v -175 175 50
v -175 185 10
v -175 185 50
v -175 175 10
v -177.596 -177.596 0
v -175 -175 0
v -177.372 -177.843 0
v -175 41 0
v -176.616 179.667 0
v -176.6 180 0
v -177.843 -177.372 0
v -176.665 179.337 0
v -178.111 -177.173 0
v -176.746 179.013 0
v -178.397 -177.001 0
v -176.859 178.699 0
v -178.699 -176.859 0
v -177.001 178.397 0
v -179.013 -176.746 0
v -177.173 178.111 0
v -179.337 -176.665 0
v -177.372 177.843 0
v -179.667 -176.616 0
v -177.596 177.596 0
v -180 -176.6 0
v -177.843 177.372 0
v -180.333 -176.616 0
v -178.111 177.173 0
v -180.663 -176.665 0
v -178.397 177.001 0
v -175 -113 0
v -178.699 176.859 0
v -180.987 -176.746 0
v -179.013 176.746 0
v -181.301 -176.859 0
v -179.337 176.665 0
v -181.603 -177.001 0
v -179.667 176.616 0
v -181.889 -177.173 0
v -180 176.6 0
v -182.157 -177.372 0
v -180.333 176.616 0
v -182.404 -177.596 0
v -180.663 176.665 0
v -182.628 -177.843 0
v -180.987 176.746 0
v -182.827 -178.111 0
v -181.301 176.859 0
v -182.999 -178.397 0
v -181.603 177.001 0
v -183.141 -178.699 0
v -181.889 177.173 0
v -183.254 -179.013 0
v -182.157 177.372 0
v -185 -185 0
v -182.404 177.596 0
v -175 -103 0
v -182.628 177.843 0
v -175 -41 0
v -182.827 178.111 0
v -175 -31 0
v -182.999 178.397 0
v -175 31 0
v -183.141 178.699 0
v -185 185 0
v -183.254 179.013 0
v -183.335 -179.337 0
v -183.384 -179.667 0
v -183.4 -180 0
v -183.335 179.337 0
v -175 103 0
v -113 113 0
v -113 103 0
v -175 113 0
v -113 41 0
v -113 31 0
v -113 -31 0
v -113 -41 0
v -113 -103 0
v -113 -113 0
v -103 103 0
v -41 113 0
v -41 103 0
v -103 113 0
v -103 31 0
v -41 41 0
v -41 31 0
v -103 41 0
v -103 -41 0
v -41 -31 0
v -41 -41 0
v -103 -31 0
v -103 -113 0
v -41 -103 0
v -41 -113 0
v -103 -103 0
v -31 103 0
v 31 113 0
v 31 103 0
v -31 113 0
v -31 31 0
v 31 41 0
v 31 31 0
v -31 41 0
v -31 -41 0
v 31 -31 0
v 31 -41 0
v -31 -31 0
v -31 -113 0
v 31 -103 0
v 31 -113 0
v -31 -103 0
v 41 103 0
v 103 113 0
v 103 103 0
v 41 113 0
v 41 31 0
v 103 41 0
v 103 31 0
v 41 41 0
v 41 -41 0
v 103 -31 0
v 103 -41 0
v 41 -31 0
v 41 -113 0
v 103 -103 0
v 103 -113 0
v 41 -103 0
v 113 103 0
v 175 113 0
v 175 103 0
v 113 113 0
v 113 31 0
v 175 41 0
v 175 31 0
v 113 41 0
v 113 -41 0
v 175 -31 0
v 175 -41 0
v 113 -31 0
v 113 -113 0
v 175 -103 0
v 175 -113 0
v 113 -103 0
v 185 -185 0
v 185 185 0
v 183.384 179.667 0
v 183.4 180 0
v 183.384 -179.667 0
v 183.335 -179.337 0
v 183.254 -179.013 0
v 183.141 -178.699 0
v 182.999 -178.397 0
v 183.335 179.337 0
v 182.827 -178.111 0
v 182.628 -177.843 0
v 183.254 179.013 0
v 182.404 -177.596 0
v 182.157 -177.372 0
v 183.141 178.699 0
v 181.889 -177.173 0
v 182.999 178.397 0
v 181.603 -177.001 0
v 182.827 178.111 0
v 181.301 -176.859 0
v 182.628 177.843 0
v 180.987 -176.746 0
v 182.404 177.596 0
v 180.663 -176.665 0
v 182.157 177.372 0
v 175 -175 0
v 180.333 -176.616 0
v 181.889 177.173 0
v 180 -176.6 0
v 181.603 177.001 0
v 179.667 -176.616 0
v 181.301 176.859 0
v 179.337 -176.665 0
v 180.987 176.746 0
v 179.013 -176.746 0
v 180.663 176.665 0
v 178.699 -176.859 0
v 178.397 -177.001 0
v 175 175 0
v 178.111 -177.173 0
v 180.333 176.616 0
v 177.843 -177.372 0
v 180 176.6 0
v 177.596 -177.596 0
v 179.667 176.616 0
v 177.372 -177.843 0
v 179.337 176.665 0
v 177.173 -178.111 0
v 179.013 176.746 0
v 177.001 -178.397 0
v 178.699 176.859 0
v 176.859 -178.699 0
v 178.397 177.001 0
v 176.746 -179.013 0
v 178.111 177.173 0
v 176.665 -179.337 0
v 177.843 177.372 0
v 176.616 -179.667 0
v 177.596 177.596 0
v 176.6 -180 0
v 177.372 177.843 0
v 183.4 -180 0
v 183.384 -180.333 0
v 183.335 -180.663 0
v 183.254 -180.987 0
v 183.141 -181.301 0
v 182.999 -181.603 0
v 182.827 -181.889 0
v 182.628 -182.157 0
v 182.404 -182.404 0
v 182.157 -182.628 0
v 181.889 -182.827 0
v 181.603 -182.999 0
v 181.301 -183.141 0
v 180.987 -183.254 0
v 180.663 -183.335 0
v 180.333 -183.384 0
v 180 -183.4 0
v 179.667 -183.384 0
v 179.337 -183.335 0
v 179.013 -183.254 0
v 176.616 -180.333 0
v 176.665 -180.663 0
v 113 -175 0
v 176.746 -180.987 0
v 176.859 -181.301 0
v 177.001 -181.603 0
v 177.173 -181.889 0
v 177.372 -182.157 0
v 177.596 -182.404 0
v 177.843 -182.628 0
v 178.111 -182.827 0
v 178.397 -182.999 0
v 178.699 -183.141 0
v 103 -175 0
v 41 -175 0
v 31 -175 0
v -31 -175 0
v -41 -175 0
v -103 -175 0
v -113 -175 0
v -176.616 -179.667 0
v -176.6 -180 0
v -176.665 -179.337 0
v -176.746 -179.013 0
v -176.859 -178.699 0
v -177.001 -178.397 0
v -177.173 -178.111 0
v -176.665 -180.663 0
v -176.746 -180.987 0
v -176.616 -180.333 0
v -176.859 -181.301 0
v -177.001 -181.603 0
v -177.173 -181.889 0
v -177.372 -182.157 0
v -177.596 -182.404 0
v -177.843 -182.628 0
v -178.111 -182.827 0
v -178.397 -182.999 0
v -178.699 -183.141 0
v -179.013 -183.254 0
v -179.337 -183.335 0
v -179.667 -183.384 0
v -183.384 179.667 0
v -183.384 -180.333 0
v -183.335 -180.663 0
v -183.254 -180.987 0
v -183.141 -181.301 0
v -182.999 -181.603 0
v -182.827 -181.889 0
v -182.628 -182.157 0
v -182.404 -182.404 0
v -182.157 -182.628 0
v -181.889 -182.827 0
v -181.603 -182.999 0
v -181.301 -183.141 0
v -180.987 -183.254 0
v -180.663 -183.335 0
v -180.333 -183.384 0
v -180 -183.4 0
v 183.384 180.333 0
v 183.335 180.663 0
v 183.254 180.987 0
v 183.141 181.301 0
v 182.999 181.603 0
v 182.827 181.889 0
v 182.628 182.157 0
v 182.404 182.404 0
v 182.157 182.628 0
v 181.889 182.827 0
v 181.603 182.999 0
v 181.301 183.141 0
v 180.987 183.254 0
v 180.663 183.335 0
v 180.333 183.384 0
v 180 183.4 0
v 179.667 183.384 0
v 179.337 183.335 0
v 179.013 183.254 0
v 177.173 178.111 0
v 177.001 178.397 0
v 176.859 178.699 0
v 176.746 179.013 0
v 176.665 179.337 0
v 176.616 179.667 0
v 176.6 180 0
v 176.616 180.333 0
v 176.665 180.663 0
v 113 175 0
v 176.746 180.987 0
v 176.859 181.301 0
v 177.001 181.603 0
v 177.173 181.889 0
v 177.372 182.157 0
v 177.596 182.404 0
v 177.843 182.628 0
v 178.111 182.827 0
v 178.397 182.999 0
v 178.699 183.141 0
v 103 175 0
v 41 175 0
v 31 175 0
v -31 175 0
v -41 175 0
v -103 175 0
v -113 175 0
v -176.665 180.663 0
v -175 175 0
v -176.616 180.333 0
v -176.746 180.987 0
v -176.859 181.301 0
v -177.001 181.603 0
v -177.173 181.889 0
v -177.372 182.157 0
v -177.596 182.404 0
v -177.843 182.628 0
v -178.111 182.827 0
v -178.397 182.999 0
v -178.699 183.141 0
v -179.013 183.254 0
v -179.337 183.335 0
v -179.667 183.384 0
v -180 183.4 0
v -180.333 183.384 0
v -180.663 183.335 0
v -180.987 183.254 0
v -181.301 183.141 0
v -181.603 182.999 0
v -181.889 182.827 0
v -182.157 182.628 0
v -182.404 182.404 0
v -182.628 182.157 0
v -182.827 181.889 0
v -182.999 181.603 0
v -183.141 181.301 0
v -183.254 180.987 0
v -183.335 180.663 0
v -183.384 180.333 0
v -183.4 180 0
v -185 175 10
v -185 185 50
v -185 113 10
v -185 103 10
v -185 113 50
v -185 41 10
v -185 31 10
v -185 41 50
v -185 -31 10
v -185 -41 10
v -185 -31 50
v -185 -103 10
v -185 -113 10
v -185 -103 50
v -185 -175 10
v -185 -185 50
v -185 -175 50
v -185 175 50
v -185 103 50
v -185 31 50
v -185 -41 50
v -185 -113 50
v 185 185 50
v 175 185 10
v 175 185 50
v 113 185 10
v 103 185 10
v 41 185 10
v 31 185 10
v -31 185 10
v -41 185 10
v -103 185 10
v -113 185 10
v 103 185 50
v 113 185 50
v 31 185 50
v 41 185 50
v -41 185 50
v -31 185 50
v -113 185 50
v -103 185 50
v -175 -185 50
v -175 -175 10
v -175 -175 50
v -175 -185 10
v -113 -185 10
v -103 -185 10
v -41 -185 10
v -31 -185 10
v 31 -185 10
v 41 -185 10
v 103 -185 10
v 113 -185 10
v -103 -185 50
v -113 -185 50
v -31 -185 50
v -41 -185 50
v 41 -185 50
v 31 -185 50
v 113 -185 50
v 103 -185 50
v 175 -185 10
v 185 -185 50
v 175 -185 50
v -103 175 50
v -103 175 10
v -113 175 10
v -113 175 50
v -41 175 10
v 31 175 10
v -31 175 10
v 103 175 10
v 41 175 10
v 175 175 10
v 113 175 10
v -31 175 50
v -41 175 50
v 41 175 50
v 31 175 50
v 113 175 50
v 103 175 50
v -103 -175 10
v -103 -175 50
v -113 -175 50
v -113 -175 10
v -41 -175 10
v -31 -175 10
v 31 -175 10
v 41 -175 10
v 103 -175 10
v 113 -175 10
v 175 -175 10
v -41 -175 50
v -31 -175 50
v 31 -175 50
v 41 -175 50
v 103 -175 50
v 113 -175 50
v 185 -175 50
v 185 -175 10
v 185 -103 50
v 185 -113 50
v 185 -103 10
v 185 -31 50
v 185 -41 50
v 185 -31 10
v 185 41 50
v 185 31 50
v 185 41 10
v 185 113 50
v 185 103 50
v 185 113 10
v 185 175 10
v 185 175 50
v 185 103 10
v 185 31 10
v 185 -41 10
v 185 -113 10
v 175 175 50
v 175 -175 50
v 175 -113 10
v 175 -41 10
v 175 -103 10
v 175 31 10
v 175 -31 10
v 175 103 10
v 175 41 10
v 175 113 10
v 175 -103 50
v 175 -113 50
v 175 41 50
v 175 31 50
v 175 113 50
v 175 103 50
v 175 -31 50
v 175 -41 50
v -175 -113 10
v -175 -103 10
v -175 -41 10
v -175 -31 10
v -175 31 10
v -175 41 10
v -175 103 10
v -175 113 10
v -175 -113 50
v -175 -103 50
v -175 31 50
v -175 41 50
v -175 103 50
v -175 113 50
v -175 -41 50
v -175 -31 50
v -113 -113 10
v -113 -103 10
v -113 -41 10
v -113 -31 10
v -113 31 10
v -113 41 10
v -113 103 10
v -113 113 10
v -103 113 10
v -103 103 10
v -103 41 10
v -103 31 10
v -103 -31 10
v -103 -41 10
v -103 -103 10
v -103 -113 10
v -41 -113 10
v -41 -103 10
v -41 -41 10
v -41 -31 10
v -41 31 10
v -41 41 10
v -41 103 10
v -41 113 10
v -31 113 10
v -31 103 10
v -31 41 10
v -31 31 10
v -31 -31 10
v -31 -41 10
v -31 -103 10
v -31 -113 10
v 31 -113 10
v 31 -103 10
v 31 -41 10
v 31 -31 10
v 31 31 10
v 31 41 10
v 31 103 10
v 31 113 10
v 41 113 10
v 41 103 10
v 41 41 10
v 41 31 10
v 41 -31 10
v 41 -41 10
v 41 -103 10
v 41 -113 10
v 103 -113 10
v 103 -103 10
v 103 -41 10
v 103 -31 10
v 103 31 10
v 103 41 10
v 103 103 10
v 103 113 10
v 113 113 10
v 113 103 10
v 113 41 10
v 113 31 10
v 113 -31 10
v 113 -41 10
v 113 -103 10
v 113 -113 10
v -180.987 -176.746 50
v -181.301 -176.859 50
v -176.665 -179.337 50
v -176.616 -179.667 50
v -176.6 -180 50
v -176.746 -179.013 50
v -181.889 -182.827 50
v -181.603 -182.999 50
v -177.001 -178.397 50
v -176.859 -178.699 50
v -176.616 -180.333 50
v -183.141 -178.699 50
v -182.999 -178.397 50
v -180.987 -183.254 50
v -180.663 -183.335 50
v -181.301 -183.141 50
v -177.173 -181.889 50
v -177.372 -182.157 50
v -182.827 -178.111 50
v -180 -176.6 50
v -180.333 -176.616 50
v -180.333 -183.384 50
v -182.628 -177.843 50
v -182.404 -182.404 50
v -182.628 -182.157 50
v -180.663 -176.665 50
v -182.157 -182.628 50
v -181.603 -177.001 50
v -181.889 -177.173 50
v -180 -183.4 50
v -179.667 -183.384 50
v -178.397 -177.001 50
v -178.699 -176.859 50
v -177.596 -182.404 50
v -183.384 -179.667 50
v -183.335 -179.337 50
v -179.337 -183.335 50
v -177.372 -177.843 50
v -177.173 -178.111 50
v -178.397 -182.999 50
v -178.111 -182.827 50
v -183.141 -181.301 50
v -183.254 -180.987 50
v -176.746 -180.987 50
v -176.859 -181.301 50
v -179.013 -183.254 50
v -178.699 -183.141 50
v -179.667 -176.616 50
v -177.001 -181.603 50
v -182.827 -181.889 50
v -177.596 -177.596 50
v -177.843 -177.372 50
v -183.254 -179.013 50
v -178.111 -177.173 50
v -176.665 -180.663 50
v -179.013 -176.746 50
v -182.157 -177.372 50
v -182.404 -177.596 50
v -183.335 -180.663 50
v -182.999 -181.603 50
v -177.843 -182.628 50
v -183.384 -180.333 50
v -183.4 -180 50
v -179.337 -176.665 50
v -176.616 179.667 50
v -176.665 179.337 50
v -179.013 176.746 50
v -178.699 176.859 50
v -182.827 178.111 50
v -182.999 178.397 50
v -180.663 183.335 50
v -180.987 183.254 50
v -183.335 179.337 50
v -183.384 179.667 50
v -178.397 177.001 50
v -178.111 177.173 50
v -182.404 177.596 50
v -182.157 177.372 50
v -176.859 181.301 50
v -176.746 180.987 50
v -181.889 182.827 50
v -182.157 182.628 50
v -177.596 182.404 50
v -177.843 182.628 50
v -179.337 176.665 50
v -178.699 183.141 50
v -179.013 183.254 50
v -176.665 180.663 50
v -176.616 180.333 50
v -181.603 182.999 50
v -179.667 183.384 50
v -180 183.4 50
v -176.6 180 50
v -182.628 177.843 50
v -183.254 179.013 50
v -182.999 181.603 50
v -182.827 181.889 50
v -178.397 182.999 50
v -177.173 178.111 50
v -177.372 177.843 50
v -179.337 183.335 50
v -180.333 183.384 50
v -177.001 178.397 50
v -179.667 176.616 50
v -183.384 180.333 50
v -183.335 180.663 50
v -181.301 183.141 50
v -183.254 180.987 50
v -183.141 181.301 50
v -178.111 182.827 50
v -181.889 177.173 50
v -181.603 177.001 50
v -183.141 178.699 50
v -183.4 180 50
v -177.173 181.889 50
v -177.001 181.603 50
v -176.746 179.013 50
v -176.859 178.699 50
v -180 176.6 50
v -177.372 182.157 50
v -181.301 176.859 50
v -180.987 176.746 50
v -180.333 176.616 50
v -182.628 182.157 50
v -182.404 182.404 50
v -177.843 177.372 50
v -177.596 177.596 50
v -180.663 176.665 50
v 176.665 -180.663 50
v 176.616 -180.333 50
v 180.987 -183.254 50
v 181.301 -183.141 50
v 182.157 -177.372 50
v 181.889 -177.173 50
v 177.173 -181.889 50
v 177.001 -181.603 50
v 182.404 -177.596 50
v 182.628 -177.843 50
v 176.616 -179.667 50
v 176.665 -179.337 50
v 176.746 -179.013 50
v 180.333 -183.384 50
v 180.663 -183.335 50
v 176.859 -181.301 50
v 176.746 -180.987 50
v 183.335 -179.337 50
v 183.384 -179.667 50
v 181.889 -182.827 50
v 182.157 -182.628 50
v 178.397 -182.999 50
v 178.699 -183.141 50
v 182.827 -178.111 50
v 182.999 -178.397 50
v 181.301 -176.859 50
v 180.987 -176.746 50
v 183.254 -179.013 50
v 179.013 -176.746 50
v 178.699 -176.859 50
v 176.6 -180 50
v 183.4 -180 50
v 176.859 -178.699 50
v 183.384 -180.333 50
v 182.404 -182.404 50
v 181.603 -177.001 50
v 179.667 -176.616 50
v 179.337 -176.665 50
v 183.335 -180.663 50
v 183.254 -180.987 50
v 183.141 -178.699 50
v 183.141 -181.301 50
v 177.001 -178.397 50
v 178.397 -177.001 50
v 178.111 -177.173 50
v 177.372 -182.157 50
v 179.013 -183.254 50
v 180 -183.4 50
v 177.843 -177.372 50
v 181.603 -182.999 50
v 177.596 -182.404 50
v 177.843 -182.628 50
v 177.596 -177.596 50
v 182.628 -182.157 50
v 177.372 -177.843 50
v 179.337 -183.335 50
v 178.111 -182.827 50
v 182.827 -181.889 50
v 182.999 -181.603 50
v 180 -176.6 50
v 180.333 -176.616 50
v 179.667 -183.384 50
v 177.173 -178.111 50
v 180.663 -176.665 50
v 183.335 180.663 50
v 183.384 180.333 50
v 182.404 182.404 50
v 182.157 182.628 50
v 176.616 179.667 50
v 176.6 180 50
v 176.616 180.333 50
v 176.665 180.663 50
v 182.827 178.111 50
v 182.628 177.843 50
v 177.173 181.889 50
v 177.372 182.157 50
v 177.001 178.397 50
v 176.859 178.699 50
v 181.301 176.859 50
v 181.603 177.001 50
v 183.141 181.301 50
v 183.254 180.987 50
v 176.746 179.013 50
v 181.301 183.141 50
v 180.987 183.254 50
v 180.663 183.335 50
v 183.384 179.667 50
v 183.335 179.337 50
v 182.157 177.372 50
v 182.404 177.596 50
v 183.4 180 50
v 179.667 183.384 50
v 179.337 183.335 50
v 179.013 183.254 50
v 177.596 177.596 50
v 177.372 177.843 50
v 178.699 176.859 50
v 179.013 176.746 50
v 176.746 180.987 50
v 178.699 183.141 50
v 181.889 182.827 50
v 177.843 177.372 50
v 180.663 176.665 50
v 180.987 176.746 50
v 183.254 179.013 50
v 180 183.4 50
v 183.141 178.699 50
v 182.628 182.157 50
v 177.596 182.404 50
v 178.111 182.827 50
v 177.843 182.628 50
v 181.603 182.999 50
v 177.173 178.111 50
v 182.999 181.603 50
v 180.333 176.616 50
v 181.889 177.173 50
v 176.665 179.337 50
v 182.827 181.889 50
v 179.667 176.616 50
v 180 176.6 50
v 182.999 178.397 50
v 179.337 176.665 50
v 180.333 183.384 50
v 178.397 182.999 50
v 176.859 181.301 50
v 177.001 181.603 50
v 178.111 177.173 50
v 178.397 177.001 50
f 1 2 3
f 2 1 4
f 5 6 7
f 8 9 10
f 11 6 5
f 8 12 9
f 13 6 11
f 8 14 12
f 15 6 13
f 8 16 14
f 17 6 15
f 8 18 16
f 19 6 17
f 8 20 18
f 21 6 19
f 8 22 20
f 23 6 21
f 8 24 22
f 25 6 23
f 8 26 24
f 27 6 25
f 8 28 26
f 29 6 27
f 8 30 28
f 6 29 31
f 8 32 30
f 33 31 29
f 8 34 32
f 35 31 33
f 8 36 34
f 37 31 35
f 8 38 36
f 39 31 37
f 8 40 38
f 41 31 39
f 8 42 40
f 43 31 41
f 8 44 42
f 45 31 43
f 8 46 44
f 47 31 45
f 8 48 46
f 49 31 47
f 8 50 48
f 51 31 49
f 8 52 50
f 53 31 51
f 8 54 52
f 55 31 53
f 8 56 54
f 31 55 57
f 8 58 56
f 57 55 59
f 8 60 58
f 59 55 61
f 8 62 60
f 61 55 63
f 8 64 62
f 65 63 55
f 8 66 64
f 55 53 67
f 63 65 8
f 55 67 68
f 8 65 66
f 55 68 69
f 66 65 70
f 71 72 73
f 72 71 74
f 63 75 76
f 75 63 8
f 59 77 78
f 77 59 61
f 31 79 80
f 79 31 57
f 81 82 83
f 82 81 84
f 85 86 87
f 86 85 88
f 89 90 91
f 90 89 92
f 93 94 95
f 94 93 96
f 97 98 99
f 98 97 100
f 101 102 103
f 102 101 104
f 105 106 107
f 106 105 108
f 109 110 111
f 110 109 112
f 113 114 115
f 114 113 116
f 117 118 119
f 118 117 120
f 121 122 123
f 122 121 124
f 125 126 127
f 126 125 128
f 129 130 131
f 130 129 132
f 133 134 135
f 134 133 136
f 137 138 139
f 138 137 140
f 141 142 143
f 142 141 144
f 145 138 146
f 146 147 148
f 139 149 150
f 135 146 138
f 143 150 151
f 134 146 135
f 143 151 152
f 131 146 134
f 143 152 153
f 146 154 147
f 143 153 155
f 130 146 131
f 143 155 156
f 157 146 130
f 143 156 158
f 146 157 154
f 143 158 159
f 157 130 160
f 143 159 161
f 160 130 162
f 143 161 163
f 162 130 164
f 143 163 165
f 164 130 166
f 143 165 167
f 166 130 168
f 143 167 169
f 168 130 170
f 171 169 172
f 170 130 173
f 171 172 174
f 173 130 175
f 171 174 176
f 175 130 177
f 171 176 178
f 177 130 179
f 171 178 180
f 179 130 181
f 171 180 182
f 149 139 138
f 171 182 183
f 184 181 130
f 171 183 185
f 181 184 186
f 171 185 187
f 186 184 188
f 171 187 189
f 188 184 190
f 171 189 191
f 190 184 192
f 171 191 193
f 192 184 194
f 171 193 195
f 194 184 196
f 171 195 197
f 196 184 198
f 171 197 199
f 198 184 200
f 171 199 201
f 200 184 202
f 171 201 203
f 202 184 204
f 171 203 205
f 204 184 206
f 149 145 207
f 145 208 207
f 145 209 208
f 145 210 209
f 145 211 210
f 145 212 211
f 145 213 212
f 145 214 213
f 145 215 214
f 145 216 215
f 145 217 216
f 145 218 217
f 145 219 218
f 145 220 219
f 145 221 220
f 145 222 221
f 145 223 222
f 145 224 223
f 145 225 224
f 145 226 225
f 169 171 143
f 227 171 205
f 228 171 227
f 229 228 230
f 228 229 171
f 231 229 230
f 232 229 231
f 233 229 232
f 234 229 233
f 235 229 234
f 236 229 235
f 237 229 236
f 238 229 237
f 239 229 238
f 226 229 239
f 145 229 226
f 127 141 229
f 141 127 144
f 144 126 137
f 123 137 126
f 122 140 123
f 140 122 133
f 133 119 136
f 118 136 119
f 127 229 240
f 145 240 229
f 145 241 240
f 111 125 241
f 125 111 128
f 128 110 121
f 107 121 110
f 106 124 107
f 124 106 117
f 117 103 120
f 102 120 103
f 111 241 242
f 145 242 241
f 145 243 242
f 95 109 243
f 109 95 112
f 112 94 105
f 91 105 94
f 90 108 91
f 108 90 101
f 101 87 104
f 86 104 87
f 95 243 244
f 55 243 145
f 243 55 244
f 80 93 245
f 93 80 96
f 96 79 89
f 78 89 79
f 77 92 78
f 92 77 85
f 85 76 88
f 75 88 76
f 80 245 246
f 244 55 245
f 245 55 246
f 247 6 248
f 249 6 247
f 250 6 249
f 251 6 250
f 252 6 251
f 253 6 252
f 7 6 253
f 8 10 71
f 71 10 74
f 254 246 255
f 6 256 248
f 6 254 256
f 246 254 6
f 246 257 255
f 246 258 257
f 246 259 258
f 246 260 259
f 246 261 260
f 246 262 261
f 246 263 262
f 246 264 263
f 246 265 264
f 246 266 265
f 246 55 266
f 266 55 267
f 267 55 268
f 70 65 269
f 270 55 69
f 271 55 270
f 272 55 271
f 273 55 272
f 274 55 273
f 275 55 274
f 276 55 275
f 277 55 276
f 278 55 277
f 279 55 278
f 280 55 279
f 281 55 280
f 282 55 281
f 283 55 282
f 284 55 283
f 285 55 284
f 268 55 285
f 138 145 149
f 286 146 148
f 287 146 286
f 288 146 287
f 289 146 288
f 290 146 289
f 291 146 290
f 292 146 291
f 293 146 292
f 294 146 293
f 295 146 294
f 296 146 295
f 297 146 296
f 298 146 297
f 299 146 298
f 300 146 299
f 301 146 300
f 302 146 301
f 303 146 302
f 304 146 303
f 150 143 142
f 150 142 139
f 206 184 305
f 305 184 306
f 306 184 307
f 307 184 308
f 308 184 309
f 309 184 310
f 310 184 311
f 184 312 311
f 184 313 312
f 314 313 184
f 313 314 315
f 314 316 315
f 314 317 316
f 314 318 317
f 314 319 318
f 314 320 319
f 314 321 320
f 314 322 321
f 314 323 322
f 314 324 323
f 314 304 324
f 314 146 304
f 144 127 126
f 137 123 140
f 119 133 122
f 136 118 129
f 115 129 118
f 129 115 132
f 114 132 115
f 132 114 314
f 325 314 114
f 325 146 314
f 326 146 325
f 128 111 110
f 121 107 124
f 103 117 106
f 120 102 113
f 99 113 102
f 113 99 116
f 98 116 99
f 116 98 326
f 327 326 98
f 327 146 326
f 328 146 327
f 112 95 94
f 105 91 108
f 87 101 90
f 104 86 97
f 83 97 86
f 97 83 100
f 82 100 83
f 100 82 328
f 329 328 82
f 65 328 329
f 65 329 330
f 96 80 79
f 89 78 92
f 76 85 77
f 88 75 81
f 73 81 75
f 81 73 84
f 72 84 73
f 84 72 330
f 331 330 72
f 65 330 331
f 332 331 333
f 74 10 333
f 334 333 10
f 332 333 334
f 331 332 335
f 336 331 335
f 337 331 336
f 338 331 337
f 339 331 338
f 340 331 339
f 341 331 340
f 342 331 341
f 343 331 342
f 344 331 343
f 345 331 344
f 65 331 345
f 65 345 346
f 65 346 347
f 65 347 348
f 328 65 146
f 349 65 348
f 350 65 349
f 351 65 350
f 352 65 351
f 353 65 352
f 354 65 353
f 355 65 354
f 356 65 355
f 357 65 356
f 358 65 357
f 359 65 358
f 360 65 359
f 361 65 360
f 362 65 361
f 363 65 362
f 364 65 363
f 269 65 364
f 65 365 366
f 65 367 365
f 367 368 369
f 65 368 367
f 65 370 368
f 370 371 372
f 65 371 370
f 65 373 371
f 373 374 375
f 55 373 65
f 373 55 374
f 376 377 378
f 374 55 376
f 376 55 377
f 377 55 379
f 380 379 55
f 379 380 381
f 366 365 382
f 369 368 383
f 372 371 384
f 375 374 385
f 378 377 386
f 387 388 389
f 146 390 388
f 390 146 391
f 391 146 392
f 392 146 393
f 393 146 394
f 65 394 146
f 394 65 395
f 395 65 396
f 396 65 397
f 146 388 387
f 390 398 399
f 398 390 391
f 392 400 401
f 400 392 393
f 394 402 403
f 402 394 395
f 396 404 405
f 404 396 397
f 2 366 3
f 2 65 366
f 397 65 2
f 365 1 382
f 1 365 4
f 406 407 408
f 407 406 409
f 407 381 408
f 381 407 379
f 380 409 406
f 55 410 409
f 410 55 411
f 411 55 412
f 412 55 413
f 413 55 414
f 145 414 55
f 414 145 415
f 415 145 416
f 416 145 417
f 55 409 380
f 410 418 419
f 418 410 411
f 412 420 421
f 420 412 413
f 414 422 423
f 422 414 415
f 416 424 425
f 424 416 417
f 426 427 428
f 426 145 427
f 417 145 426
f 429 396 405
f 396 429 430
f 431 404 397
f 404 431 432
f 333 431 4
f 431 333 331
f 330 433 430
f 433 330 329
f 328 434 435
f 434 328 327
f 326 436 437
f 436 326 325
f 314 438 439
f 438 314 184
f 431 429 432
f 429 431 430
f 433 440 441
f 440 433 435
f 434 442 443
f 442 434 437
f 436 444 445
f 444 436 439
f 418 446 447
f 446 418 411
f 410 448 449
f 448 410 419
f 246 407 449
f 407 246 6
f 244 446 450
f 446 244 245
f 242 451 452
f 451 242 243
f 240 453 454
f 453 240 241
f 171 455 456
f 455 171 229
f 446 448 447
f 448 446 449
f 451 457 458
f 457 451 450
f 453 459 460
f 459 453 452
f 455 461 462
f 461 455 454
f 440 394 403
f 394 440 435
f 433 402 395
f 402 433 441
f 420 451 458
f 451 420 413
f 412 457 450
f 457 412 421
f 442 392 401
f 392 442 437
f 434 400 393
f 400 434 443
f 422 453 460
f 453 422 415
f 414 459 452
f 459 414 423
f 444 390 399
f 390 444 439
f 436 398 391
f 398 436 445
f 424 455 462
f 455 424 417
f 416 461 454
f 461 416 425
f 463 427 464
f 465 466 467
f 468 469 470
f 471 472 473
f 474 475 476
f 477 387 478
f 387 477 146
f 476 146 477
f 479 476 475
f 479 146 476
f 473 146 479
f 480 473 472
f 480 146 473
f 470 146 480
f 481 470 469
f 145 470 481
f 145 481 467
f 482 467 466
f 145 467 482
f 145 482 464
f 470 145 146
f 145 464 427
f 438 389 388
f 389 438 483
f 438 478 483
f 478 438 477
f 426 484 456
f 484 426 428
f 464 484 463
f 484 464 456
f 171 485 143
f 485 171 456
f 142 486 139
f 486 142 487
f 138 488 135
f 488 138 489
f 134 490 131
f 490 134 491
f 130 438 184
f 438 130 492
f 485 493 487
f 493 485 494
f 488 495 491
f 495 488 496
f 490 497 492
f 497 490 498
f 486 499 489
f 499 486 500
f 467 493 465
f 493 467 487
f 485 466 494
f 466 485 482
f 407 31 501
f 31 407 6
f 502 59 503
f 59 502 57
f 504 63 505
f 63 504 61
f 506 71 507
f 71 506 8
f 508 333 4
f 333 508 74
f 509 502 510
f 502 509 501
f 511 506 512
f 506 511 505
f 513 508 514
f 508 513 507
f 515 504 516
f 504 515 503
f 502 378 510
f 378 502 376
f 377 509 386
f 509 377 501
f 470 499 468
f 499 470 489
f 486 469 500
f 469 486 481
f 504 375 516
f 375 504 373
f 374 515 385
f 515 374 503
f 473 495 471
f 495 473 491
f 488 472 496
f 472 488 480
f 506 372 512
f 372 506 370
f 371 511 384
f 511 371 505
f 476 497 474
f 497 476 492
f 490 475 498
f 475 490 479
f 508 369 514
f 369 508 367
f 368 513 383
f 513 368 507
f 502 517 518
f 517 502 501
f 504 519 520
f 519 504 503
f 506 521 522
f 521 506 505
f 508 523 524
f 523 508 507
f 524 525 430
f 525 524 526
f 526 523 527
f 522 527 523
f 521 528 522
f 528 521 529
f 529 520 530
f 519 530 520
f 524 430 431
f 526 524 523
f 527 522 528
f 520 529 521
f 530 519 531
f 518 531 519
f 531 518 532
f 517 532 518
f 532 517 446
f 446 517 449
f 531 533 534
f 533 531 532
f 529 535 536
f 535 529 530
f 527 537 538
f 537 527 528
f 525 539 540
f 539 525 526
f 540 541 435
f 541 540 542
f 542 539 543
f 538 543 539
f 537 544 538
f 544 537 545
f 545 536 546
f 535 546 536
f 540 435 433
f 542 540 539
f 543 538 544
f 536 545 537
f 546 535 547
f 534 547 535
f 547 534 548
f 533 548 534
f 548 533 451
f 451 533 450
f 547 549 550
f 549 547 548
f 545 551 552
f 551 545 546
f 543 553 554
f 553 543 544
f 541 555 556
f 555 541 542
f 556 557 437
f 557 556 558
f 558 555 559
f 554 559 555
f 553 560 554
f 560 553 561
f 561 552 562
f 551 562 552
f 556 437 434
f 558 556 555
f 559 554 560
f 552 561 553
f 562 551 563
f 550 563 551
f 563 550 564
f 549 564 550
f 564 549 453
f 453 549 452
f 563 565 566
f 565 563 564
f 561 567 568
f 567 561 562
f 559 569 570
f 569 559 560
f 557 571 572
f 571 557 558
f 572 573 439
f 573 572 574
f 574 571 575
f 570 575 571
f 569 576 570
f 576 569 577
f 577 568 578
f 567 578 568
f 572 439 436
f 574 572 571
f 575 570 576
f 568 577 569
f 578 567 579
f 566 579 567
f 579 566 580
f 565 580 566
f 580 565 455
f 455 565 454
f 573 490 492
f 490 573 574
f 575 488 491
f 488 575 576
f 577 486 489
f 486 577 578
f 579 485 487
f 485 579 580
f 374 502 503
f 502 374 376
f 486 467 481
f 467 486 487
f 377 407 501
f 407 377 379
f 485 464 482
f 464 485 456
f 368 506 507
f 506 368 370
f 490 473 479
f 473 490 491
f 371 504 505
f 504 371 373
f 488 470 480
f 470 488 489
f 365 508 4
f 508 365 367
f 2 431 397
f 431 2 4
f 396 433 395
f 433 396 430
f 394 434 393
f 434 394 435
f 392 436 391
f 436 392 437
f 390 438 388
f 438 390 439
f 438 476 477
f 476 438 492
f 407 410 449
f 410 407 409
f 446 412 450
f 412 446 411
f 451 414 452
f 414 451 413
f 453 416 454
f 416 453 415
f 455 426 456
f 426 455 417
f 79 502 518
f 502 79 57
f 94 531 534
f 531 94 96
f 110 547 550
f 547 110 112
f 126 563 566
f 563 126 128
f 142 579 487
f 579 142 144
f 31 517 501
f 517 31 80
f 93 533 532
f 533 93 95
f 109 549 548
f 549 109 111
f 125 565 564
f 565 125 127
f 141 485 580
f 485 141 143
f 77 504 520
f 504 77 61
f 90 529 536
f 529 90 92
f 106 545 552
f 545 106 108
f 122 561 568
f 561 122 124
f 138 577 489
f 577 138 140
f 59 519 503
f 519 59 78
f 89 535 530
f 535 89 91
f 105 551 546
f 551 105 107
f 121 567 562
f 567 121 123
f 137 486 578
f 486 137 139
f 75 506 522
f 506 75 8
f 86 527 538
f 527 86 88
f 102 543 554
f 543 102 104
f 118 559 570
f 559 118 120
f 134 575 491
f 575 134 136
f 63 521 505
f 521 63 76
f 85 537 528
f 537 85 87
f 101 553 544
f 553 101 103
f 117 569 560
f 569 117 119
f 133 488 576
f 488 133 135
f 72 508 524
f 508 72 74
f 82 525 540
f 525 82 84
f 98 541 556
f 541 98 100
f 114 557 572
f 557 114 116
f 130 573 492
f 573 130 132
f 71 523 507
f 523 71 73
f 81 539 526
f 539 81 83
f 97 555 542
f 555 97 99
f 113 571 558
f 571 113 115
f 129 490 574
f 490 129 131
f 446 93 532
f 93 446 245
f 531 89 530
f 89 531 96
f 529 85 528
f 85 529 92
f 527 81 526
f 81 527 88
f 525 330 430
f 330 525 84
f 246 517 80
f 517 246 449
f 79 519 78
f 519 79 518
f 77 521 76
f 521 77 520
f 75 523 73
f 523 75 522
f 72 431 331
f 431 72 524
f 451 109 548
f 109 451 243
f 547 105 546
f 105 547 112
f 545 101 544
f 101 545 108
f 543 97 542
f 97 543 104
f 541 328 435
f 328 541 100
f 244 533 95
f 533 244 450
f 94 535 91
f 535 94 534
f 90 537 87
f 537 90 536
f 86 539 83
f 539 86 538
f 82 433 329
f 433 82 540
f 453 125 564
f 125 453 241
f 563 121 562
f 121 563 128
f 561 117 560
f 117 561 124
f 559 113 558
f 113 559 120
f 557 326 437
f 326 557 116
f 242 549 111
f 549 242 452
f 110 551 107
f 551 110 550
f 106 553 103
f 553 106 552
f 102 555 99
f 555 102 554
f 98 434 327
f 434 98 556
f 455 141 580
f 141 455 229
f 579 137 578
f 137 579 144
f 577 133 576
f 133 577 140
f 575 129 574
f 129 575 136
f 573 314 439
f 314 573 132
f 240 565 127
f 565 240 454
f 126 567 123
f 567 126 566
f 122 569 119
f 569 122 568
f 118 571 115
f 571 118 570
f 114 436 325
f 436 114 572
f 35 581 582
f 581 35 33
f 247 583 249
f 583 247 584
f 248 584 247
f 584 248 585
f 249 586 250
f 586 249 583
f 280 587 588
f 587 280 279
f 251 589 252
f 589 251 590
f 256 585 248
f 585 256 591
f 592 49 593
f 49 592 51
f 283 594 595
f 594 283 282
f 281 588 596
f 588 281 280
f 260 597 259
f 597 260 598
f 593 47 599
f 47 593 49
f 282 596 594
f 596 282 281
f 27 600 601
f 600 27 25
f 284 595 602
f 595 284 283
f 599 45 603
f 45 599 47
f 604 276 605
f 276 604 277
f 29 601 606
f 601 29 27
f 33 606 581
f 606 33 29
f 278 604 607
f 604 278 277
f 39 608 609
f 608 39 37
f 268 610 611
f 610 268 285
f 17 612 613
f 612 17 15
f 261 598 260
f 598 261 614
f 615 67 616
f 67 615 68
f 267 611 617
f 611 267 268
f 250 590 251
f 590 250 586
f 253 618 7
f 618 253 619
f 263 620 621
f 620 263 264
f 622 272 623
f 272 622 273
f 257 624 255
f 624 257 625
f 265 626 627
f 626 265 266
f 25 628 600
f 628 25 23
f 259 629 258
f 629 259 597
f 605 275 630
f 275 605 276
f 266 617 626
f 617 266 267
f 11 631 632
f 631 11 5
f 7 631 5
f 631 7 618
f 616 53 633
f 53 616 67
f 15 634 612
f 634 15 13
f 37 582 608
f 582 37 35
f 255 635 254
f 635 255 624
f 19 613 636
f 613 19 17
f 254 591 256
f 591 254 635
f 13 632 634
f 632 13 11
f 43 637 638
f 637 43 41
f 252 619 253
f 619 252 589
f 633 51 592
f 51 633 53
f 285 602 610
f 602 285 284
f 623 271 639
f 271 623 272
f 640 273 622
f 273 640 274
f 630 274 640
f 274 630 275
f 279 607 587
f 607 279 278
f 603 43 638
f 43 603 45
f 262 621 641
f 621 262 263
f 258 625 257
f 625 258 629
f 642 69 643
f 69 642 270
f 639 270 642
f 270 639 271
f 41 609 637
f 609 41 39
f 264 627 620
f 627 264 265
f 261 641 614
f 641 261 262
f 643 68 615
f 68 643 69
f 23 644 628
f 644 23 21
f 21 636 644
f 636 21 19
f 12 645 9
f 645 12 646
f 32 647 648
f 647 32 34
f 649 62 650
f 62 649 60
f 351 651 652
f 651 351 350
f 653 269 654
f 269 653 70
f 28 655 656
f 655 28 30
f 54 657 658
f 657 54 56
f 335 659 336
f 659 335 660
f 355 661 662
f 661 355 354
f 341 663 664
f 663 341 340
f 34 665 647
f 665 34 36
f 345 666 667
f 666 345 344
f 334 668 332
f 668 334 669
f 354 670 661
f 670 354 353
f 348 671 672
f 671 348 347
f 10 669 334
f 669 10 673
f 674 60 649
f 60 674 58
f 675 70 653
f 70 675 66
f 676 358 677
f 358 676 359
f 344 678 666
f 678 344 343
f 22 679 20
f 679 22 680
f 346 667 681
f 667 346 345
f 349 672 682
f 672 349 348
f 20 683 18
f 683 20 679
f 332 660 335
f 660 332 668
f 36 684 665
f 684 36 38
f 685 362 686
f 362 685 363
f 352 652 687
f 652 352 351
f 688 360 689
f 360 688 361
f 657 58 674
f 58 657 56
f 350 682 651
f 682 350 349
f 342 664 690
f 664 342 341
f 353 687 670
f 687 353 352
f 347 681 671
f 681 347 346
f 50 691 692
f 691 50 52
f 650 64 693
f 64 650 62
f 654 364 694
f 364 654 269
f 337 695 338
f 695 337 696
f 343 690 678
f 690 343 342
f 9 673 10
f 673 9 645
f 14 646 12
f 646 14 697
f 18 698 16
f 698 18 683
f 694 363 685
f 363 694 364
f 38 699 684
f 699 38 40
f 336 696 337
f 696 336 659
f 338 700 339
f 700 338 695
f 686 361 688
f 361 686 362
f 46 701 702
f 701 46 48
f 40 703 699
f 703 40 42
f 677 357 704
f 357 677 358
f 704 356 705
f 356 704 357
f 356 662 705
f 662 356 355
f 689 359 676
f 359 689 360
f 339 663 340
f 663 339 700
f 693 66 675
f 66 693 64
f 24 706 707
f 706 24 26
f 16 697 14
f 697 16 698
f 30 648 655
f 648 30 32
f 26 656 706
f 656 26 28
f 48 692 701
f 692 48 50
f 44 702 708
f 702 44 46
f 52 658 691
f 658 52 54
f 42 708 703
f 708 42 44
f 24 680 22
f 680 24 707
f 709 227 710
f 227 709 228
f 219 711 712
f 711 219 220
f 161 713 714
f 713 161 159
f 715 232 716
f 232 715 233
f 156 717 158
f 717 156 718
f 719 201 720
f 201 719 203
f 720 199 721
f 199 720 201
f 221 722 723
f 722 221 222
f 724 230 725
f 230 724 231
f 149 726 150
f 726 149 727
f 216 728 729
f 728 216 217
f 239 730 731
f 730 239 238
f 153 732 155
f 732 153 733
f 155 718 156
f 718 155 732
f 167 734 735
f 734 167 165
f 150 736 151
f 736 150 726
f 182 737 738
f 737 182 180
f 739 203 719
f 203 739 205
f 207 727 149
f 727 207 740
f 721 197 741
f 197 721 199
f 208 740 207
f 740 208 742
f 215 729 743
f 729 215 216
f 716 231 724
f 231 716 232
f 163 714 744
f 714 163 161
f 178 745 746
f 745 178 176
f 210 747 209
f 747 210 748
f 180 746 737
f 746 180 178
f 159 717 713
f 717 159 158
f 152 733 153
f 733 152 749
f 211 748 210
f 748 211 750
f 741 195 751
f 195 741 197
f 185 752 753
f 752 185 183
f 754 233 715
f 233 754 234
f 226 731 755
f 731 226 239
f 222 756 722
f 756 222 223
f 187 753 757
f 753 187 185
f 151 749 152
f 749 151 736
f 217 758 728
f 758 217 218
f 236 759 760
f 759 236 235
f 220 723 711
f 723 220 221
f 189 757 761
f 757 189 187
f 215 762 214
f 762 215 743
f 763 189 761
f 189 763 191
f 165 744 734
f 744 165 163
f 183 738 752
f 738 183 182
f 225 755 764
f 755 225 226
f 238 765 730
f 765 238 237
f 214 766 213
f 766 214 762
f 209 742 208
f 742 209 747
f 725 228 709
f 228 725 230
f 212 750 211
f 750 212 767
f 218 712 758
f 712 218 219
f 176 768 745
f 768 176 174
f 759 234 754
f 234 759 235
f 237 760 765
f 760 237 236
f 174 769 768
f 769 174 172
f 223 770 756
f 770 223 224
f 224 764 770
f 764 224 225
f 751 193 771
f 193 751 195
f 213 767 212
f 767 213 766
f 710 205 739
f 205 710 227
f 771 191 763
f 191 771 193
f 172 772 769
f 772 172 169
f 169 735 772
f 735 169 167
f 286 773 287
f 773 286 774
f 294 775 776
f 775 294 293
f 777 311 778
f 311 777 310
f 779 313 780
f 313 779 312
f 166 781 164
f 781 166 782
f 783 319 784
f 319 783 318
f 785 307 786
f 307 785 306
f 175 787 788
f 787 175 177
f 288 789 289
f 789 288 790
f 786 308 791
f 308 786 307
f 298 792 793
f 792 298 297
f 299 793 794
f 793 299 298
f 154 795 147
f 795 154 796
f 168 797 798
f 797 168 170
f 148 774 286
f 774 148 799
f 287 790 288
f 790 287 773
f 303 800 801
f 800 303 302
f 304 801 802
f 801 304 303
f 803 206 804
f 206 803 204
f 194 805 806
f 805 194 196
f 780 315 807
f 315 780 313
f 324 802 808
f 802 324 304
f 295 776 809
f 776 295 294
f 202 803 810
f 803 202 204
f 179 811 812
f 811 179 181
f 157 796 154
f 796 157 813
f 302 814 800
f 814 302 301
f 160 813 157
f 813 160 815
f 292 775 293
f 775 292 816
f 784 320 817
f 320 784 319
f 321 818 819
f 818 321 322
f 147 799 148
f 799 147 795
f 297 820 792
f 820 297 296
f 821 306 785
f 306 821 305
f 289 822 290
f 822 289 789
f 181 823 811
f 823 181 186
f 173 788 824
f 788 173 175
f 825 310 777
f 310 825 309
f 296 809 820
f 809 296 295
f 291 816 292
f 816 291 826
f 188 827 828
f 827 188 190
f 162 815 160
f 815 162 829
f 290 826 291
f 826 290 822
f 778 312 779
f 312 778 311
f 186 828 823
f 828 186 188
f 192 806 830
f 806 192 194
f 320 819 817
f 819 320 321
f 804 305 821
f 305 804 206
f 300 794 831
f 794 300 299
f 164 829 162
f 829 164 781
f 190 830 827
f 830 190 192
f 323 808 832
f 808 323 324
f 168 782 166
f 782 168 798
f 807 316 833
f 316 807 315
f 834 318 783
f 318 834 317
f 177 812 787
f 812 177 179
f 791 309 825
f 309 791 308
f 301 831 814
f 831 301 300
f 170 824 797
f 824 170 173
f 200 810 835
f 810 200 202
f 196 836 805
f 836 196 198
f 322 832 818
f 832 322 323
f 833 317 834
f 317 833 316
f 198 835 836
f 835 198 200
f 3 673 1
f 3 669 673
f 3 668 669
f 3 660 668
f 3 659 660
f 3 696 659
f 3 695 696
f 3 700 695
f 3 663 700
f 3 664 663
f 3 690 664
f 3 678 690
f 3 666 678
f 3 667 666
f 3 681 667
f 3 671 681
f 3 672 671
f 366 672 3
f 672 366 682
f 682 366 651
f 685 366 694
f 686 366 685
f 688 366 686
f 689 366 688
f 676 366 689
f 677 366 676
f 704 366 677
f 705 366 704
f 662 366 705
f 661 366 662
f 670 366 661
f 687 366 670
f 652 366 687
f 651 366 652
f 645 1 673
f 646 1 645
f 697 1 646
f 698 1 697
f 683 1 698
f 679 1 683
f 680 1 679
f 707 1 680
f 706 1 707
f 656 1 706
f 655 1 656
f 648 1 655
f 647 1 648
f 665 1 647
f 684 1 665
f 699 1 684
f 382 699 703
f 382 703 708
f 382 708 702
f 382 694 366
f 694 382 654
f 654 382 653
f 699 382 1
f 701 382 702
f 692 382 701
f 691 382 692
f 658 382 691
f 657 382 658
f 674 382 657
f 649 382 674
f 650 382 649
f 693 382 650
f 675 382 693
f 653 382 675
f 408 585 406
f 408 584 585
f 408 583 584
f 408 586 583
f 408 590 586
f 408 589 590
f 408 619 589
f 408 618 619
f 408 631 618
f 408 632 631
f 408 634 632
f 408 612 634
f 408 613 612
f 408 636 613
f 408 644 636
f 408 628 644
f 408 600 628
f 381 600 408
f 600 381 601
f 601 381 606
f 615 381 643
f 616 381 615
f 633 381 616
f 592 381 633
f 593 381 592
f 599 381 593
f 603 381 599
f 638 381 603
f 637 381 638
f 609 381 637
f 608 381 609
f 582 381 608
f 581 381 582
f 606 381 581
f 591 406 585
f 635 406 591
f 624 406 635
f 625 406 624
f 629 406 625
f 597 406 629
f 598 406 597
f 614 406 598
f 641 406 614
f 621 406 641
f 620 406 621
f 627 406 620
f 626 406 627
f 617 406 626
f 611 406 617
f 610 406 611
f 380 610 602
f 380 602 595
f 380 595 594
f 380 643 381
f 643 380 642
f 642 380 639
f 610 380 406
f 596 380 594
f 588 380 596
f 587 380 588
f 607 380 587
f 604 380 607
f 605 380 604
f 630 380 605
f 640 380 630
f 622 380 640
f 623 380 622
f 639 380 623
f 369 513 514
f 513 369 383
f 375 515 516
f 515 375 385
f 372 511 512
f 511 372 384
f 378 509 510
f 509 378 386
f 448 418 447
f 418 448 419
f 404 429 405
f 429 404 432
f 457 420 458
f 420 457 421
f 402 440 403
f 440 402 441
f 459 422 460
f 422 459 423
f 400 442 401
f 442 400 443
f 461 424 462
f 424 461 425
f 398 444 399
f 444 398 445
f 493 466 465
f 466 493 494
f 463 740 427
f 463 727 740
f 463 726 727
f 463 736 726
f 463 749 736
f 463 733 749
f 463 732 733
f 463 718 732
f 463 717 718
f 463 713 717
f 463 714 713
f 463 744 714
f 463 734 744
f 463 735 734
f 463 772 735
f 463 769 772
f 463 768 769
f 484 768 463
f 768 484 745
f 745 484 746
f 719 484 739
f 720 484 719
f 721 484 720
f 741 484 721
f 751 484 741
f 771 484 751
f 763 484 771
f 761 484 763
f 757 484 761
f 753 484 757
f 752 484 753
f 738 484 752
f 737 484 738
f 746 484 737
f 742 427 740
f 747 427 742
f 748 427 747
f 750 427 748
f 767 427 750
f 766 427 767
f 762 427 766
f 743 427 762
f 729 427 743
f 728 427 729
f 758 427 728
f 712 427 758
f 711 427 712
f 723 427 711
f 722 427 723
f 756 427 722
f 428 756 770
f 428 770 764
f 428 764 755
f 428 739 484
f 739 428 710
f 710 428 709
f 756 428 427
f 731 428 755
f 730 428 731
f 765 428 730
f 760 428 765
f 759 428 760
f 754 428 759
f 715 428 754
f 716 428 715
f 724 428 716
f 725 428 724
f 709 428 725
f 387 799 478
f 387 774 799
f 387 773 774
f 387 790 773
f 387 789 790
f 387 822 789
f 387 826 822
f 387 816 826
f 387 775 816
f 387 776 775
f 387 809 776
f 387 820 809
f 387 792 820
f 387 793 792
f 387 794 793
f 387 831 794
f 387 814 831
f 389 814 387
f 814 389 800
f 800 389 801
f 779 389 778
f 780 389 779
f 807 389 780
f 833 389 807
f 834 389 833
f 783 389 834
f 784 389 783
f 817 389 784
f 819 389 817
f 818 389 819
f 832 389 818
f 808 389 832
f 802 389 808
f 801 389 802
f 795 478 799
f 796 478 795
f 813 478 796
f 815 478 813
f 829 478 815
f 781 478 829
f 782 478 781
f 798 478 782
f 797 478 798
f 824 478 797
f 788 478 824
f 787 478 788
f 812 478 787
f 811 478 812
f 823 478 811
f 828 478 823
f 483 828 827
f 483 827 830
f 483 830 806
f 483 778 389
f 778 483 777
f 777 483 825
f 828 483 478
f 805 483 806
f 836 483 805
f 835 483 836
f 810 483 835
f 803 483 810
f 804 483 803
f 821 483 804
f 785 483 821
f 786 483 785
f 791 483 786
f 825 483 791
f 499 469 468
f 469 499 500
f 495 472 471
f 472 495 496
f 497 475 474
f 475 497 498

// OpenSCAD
// Cage slice part (z0..z1). Units: mm.
// Print orientation: normal

bar=10;
inner=[350,350,700];
gap_xy=62;      // horizontal clear gap
gap_z=61;       // vertical clear gap
hole_d=6.8;     // M6 clearance
$fn=64;

outer=[inner[0]+2*bar, inner[1]+2*bar, inner[2]+2*bar];
half=[outer[0]/2, outer[1]/2, outer[2]/2];

pitch_xy=bar+gap_xy; // 72
pitch_z=bar+gap_z;   // 71

centers=[for(i=[0:5]) -(half[0]-bar/2) + i*pitch_xy];
z_levels=[for(i=[0:10]) i*pitch_z]; // 0..710

module vbar(xc,yc){
  translate([xc-bar/2,yc-bar/2,0]) cube([bar,bar,outer[2]],center=false);
}
module hbar_x(yc,z0){
  translate([-half[0],yc-bar/2,z0]) cube([outer[0],bar,bar],center=false);
}
module hbar_y(xc,z0){
  translate([xc-bar/2,-half[1],z0]) cube([bar,outer[1],bar],center=false);
}

module grid(z0){
  union(){
    for(yc=centers) hbar_x(yc,z0);
    for(xc=centers) hbar_y(xc,z0);
  }
}

module side_verticals(){
  union(){
    for(xc=centers){
      vbar(xc,  half[1]-bar/2);
      vbar(xc, -half[1]+bar/2);
    }
    for(yc=centers){
      vbar( half[0]-bar/2, yc);
      vbar(-half[0]+bar/2, yc);
    }
  }
}

module side_rings(){
  union(){
    for(z0=z_levels){
      hbar_x( half[1]-bar/2, z0);
      hbar_x(-half[1]+bar/2, z0);
      hbar_y( half[0]-bar/2, z0);
      hbar_y(-half[0]+bar/2, z0);
    }
  }
}

module rod_holes(){
  for(sx=[-1,1],sy=[-1,1])
    translate([sx*(half[0]-bar/2), sy*(half[1]-bar/2), -1])
      cylinder(d=hole_d,h=outer[2]+2,center=false);
}

module cage(){
  difference(){
    union(){
      side_verticals();
      side_rings();
      grid(0);
      grid(outer[2]-bar); // top grid at z=710
    }
    rod_holes();
  }
}

module cage_slice(zmin,zmax){
  intersection(){
    cage();
    translate([-1000,-1000,zmin]) cube([2000,2000,zmax-zmin],center=false);
  }
}

z0=0; z1=50;
translate([0,0,-z0]) cage_slice(z0,z1);
